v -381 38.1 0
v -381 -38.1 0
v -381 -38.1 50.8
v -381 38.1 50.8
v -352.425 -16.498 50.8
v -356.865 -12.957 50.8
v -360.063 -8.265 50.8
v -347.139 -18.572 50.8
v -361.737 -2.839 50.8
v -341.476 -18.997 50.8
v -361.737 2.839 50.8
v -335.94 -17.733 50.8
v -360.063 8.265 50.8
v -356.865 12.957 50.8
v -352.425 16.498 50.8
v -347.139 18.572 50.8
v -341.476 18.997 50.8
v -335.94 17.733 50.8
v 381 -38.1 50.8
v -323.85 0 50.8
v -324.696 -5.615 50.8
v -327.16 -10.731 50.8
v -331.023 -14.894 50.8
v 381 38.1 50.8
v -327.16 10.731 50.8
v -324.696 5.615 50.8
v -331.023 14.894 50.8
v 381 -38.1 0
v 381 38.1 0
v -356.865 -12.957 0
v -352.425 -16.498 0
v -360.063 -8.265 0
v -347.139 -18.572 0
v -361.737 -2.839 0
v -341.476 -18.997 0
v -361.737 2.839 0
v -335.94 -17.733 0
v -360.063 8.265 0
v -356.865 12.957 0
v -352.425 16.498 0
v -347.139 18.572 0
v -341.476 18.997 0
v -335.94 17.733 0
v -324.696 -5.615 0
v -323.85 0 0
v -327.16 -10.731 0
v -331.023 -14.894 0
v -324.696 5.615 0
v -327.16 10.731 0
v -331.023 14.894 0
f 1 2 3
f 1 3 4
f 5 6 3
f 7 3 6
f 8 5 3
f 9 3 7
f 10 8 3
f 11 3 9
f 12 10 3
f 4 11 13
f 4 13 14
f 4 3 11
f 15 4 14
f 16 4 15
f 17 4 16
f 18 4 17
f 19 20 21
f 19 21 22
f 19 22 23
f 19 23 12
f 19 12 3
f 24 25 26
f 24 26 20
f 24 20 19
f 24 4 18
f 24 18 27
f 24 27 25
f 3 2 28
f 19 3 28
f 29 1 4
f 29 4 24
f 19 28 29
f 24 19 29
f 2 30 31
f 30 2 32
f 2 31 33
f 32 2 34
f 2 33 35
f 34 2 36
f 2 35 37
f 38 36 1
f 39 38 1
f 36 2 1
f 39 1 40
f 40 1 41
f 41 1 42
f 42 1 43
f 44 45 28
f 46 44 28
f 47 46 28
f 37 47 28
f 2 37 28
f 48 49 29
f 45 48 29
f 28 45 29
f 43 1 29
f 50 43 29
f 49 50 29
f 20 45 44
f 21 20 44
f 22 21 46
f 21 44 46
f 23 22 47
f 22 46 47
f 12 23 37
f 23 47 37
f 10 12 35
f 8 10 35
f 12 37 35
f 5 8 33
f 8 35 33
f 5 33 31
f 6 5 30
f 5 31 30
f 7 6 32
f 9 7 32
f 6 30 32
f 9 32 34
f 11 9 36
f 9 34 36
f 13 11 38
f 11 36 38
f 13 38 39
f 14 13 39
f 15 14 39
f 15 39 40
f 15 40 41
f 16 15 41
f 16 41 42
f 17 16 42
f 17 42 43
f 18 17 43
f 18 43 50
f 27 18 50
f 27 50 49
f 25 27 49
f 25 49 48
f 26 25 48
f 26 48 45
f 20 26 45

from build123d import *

# Parameters (mm, degrees)
CROQUIS1_W              = 762
CROQUIS1_H              = 76.2
SALIENTE_EXTRUIR1_DEPTH = 50.8
CROQUIS2_R              = 19.05
CORTAR_EXTRUIR5_DEPTH   = 387.255420674


with BuildPart() as part:
    # Croquis1 → Saliente-Extruir1 (new body)
    with BuildSketch(Plane.XY):
        Rectangle(CROQUIS1_W, CROQUIS1_H)
    extrude(amount=SALIENTE_EXTRUIR1_DEPTH)

    # Croquis2 → Cortar-Extruir5 (cut, through all)
    with BuildSketch(Plane(origin=(0, 0, 0), x_dir=(-1, 0, 0), z_dir=(0, 0, -1))):
        with Locations(Location((342.9, 0, 0), (0, 0, 180))):
            Circle(CROQUIS2_R)
    extrude(amount=-CORTAR_EXTRUIR5_DEPTH, mode=Mode.SUBTRACT)


solid = part.part
